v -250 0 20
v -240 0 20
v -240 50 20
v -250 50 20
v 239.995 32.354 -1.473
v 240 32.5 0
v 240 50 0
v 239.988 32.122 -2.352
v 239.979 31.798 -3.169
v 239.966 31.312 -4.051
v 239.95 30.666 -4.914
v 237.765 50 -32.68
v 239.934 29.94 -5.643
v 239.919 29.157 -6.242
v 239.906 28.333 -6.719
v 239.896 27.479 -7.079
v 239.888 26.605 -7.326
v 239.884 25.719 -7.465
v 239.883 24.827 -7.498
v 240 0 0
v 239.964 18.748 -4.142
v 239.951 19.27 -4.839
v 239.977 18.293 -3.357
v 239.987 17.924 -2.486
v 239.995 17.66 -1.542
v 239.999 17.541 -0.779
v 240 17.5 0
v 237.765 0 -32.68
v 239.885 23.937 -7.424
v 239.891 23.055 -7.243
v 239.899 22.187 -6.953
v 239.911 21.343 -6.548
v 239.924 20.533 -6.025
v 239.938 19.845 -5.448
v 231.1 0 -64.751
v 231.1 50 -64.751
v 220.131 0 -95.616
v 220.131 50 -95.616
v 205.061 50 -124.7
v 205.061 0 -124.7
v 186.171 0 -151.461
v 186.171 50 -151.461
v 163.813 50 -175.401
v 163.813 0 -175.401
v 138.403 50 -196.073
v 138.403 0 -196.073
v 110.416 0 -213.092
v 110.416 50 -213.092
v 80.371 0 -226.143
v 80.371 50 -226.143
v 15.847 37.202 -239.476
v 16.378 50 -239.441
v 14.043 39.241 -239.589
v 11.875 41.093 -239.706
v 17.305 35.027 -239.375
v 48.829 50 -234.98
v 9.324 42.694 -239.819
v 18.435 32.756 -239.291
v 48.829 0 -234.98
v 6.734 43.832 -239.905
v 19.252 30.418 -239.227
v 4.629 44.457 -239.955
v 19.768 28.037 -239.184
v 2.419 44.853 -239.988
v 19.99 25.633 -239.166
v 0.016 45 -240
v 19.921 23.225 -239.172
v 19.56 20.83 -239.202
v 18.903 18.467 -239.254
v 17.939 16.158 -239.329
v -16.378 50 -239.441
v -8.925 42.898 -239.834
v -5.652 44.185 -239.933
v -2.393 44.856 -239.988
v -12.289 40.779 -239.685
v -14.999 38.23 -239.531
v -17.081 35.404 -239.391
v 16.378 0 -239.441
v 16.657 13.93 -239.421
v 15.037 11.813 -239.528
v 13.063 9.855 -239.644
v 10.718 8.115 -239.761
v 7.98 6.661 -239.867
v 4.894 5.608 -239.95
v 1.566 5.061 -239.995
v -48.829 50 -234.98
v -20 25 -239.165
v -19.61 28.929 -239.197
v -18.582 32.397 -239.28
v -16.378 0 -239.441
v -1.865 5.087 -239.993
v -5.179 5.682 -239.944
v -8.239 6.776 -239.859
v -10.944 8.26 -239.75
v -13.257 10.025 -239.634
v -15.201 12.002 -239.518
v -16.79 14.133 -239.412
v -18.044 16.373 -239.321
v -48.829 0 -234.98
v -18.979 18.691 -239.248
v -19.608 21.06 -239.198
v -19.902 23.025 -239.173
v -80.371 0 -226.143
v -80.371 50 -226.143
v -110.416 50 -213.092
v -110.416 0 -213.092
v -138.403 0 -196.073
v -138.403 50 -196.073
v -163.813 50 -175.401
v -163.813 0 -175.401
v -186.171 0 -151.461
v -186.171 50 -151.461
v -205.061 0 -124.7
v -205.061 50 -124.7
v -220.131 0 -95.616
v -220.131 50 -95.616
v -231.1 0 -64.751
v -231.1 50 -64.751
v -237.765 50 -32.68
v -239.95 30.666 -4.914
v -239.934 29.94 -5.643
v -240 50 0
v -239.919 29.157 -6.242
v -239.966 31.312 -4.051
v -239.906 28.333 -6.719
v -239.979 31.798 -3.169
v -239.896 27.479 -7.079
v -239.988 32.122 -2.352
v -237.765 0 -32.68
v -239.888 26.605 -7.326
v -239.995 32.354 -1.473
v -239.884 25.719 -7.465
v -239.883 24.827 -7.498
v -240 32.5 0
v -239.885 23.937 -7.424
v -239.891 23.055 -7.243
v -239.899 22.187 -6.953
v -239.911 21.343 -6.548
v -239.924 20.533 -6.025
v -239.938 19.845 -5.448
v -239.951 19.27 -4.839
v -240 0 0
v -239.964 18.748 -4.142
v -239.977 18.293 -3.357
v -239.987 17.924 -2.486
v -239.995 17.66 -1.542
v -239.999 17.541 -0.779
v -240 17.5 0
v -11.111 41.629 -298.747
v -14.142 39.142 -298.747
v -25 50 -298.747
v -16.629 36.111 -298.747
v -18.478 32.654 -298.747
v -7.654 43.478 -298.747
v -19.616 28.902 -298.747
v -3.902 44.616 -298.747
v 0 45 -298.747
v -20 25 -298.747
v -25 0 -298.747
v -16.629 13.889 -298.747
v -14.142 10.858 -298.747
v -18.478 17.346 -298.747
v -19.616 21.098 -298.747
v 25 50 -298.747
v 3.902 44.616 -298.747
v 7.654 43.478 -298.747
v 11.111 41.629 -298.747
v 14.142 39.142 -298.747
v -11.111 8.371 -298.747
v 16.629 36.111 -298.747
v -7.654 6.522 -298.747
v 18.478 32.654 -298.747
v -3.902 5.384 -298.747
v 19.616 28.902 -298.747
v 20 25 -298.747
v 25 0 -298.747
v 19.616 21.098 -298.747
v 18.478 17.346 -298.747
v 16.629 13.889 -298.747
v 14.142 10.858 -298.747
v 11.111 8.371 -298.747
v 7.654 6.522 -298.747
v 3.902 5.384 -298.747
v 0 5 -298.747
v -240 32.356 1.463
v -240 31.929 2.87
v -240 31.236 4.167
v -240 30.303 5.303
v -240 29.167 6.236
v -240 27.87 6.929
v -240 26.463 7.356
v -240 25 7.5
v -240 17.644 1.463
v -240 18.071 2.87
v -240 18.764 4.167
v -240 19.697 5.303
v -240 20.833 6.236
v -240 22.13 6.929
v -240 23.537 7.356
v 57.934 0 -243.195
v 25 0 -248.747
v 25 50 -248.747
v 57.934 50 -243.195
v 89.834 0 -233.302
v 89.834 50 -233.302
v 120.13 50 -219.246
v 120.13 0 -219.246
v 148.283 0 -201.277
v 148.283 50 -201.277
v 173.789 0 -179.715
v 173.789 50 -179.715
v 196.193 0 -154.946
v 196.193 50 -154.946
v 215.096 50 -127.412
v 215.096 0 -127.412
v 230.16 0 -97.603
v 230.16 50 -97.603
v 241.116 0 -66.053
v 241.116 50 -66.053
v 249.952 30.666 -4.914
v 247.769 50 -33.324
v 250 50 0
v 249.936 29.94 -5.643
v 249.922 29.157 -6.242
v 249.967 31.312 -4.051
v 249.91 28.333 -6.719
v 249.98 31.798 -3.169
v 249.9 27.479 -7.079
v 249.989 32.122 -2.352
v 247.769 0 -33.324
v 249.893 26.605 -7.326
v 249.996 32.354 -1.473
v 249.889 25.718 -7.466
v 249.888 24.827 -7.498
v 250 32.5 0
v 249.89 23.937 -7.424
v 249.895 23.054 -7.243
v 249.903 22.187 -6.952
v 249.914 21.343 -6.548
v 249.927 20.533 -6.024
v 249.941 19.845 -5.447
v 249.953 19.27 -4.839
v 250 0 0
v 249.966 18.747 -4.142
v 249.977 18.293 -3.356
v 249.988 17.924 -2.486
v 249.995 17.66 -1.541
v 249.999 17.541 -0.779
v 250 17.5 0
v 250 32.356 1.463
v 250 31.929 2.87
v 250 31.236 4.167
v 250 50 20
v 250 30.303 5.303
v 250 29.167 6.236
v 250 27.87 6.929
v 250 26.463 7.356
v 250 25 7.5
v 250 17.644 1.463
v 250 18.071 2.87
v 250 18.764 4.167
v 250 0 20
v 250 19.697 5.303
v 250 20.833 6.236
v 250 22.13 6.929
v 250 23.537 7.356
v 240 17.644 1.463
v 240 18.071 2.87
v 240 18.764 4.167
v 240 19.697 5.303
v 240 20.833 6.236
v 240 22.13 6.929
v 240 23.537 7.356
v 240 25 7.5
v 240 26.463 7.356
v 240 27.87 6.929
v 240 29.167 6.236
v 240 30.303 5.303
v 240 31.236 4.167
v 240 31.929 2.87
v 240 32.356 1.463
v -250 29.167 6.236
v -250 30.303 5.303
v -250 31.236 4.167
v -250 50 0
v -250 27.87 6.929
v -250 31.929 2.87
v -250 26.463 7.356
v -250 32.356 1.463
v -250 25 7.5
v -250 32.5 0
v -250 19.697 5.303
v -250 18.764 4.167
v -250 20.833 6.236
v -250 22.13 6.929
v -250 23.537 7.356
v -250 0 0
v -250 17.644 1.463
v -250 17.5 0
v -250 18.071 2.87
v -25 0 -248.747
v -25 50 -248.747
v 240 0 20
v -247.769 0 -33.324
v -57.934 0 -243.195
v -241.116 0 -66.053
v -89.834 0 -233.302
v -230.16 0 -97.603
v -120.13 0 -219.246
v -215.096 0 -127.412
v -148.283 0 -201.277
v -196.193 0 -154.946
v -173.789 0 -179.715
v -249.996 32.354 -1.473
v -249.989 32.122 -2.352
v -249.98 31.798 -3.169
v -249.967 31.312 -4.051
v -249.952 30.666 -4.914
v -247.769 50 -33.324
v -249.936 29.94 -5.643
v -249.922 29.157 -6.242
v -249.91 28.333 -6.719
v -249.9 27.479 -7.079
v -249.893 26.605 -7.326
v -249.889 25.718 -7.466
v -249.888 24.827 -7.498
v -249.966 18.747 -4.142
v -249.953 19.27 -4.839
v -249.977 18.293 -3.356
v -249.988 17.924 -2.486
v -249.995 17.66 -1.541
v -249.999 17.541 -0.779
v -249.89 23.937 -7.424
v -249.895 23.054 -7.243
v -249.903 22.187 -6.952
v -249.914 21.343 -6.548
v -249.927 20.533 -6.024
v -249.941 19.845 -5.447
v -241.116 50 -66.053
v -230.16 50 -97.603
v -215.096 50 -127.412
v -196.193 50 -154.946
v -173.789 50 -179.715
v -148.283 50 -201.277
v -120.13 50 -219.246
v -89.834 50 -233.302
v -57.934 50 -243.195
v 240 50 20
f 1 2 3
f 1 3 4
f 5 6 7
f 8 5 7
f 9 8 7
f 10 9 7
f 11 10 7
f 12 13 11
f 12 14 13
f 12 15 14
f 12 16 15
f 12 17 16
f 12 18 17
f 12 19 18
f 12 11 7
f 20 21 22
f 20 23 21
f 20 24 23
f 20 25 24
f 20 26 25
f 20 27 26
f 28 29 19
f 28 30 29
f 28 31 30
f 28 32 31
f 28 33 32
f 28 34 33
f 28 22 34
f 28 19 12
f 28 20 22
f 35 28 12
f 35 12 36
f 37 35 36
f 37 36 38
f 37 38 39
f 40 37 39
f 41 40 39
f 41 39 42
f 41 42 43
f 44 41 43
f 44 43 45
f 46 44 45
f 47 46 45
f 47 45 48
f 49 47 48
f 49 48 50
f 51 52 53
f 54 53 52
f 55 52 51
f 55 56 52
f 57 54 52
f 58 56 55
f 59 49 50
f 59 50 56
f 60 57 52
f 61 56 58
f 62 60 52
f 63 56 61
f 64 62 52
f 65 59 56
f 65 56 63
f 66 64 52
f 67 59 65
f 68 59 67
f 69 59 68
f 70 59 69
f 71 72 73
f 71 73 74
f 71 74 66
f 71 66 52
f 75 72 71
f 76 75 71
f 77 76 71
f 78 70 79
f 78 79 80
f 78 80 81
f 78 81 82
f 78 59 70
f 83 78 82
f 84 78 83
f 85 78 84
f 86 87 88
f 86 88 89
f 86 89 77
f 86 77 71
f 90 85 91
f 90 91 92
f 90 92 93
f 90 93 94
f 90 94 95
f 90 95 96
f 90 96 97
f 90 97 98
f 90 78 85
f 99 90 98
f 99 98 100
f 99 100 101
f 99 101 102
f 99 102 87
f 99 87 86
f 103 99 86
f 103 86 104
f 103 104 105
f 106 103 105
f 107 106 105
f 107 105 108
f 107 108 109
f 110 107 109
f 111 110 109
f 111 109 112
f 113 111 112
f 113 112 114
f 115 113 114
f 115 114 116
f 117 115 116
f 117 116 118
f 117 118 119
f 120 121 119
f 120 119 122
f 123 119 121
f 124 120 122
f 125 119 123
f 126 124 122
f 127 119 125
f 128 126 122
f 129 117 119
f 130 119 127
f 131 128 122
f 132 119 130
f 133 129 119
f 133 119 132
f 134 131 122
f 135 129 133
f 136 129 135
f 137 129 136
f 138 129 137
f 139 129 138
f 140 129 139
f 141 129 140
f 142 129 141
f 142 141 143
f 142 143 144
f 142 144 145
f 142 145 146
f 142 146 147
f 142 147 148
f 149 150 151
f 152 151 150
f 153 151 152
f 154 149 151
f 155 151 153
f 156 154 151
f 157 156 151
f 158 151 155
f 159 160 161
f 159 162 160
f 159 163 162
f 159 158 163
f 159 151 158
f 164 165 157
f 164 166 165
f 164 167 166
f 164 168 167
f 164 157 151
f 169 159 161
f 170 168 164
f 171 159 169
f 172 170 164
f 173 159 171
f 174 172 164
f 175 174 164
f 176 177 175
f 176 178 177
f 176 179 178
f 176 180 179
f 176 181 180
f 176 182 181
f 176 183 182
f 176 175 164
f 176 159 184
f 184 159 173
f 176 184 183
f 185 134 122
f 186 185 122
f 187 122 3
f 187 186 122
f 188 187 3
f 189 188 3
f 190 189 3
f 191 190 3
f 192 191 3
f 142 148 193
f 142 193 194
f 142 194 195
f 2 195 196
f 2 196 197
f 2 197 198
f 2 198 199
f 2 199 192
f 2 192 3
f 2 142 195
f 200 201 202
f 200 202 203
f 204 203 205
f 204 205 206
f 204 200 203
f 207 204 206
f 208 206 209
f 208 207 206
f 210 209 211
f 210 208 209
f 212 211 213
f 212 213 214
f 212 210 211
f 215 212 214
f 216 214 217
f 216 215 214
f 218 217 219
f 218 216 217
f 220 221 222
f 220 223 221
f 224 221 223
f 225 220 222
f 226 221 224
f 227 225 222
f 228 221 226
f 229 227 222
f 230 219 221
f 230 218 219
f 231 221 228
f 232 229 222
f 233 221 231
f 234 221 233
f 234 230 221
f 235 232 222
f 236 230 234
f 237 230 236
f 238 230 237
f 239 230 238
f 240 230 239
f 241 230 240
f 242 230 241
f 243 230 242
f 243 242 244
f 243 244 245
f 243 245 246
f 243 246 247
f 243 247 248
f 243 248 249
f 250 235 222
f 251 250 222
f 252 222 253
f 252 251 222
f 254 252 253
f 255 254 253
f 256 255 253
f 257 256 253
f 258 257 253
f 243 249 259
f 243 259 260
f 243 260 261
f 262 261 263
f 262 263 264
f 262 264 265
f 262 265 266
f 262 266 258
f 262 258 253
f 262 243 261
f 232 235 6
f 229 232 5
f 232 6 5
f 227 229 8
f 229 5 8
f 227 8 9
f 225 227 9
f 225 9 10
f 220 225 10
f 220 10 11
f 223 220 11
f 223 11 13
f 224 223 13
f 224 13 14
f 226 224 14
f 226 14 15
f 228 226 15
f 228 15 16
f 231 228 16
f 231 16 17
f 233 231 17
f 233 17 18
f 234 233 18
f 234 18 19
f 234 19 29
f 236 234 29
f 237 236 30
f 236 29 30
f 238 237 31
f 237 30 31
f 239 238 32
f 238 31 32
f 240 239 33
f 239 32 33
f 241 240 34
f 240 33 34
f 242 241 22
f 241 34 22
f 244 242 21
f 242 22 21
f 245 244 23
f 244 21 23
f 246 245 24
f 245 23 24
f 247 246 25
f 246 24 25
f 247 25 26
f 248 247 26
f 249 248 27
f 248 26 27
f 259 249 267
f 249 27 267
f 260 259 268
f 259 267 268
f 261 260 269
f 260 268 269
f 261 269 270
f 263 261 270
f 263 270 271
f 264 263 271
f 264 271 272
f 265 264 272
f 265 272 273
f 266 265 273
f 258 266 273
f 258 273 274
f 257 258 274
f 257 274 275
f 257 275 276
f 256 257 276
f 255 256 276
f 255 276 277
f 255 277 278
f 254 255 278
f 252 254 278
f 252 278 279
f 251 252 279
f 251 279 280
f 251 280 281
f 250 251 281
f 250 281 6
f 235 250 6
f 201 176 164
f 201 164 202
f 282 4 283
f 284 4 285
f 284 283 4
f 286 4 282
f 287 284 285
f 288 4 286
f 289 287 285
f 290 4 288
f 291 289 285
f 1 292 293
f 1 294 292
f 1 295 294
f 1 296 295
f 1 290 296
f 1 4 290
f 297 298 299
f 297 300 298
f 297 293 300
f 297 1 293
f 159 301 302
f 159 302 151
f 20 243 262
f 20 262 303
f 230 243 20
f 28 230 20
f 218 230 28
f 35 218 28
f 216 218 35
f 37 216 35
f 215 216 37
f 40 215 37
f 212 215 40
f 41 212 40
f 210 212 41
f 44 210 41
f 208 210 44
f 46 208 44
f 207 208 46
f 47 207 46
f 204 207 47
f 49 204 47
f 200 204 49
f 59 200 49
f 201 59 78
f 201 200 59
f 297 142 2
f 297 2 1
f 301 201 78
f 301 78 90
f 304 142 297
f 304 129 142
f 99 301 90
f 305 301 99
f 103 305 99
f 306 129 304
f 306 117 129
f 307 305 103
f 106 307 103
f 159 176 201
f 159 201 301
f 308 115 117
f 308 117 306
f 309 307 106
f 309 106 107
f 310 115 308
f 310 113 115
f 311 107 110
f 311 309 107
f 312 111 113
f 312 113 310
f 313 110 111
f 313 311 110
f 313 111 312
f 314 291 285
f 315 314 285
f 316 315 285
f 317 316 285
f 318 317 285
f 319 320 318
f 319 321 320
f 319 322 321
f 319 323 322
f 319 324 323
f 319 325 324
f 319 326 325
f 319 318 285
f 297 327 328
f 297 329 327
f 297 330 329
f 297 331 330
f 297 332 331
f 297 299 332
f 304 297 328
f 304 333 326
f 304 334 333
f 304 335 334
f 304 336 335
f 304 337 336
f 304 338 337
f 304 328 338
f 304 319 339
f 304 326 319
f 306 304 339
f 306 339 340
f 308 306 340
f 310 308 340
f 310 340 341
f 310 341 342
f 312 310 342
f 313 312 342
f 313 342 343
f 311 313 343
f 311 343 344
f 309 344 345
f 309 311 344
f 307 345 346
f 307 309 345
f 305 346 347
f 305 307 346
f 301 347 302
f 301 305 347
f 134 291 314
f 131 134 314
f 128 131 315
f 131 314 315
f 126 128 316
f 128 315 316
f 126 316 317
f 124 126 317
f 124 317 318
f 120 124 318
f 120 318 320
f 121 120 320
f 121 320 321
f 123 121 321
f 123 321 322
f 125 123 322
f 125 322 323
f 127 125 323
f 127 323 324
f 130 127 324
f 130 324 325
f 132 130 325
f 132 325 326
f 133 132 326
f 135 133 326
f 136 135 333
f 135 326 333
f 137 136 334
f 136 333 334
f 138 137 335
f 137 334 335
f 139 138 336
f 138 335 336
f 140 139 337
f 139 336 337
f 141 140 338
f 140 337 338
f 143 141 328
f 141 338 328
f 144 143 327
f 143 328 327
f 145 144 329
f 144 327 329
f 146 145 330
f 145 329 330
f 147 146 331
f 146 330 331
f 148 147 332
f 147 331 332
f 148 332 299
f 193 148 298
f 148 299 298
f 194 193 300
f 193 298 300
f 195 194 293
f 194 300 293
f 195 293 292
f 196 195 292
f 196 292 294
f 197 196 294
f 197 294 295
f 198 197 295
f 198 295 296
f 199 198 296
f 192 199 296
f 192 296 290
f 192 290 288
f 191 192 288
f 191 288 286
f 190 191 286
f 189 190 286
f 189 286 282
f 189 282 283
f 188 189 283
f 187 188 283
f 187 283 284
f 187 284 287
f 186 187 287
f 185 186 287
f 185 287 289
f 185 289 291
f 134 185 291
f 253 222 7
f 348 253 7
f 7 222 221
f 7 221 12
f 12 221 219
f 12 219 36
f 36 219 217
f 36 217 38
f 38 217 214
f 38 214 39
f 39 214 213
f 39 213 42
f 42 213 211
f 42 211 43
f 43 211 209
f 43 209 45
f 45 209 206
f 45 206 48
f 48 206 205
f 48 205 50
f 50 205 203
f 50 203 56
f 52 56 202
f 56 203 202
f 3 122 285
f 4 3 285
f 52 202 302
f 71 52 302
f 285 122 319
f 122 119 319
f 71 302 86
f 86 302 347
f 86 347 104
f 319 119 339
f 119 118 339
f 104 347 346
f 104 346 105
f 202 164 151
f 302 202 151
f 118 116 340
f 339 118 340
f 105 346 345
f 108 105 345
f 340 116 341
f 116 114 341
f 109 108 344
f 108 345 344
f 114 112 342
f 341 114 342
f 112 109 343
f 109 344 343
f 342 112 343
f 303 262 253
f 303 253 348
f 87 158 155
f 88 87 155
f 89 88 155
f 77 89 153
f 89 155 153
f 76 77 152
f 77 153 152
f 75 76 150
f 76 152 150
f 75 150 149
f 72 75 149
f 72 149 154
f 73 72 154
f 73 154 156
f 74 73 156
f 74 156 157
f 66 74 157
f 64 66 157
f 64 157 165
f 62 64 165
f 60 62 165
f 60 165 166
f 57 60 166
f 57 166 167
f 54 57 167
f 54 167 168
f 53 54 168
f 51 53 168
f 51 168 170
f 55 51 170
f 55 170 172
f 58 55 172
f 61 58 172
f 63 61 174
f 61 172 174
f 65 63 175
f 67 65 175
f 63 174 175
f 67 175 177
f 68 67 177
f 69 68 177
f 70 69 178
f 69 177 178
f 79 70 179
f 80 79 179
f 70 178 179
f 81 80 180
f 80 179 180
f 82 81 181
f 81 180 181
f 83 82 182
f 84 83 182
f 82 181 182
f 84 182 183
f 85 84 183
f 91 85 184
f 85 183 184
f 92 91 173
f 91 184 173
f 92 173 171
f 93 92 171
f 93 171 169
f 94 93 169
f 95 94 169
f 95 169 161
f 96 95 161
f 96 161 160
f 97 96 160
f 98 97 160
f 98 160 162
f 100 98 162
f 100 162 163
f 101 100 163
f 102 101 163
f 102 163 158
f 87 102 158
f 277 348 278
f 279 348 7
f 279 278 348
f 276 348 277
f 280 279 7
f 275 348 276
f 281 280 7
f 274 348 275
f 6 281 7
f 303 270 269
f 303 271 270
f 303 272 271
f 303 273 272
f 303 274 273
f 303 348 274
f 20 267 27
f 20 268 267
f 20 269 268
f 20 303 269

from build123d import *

# Parameters (mm, degrees)
BOSS_EXTRUDE1_DEPTH = 50
SKETCH2_R           = 20
CUT_EXTRUDE1_DEPTH  = 409.166094009
SKETCH3_R           = 7.5
CUT_EXTRUDE2_DEPTH  = 585.593607558


with BuildPart() as part:
    # Sketch1 → Boss-Extrude1 (new body)
    with BuildSketch(Plane(origin=(0, 0, 0), x_dir=(1, 0, 0), z_dir=(0, 1, 0))):
        with BuildLine():
            Line((-25, 298.746859277), (25, 298.746859277))
            Line((25, 298.746859277), (25, 248.746859277))
            ThreePointArc((25, 248.746859277), (185.404962177, 167.705098312), (250, 0))
            Line((250, 0), (250, -20))
            Line((250, -20), (240, -20))
            Line((240, -20), (240, 0))
            ThreePointArc((240, 0), (0, 240), (-240, 0))
            Line((-240, 0), (-240, -20))
            Line((-240, -20), (-250, -20))
            Line((-250, -20), (-250, 0))
            ThreePointArc((-250, 0), (-185.404962177, 167.705098312), (-25, 248.746859277))
            Line((-25, 248.746859277), (-25, 298.746859277))
        make_face()
    extrude(amount=BOSS_EXTRUDE1_DEPTH)

    # Sketch2 → Cut-Extrude1 (cut, through all)
    with BuildSketch(Plane(origin=(0, 0, -298.746859277), x_dir=(-1, 0, 0), z_dir=(0, 0, -1))):
        with Locations((0, 25)):
            Circle(SKETCH2_R)
    extrude(amount=-CUT_EXTRUDE1_DEPTH, mode=Mode.SUBTRACT)

    # Sketch3 → Cut-Extrude2 (cut, through all)
    with BuildSketch(Plane.ZY.offset(250)):
        with Locations((0, 25)):
            Circle(SKETCH3_R)
    extrude(amount=-CUT_EXTRUDE2_DEPTH, mode=Mode.SUBTRACT)


solid = part.part
